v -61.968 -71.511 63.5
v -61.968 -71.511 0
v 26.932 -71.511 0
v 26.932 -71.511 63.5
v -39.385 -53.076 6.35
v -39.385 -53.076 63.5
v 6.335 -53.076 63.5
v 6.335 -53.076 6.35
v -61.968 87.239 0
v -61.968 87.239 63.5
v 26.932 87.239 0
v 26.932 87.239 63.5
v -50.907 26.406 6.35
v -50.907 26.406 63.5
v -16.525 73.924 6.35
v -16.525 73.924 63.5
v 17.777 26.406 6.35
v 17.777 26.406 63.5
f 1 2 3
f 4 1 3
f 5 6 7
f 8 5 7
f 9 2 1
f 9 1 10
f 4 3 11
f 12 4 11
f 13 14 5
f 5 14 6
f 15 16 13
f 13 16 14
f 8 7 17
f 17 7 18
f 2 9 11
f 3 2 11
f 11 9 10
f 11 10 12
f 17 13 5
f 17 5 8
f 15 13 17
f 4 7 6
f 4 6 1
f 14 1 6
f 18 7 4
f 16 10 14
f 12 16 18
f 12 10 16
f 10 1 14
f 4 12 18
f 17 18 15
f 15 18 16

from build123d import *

# Parameters (mm, degrees)
F0_W     = 88.9
F0_H     = 158.75
F1_DEPTH = 63.5
F2_W     = 22.86
F2_H     = 14.4977445151
F2_H_2   = 79.4822554849
F3_DEPTH = 57.15


with BuildPart() as f1:
    # F0 (on Top) → F1 (new body)
    with BuildSketch(Plane.XY):
        with Locations((-17.5175424735, 7.864119485)):
            Rectangle(F0_W, F0_H)
    extrude(amount=F1_DEPTH)

    # F2 (on face) → F3 (cut)
    with BuildSketch(Plane.XY.offset(63.5)):
        Polygon((-16.525246546, 73.9238959342), (-16.525246546, 40.9038959342), (6.334753454, 40.9038959342), (6.334753454, 26.4061514191), (17.7769116252, 26.4061514191), align=None)
        Polygon((-39.385246546, 26.4061514191), (-39.385246546, 40.9038959342), (-16.525246546, 40.9038959342), (-16.525246546, 73.9238959342), (-50.9065217465, 26.4061514191), align=None)
        with Locations((-27.955246546, 33.6550236767)):
            Rectangle(F2_W, F2_H)
        with Locations((-5.095246546, 33.6550236767)):
            Rectangle(F2_W, F2_H)
        with Locations((-5.095246546, -13.3349763233)):
            Rectangle(F2_W, F2_H_2)
        Polygon((17.7769116252, 26.4061514191), (6.334753454, 26.4061514191), (6.334753454, -53.0761040658), align=None)
        with Locations((-27.955246546, -13.3349763233)):
            Rectangle(F2_W, F2_H_2)
        Polygon((-39.385246546, -53.0761040658), (-39.385246546, 26.4061514191), (-50.9065217465, 26.4061514191), align=None)
    extrude(amount=-F3_DEPTH, mode=Mode.SUBTRACT)


solid = f1.part
